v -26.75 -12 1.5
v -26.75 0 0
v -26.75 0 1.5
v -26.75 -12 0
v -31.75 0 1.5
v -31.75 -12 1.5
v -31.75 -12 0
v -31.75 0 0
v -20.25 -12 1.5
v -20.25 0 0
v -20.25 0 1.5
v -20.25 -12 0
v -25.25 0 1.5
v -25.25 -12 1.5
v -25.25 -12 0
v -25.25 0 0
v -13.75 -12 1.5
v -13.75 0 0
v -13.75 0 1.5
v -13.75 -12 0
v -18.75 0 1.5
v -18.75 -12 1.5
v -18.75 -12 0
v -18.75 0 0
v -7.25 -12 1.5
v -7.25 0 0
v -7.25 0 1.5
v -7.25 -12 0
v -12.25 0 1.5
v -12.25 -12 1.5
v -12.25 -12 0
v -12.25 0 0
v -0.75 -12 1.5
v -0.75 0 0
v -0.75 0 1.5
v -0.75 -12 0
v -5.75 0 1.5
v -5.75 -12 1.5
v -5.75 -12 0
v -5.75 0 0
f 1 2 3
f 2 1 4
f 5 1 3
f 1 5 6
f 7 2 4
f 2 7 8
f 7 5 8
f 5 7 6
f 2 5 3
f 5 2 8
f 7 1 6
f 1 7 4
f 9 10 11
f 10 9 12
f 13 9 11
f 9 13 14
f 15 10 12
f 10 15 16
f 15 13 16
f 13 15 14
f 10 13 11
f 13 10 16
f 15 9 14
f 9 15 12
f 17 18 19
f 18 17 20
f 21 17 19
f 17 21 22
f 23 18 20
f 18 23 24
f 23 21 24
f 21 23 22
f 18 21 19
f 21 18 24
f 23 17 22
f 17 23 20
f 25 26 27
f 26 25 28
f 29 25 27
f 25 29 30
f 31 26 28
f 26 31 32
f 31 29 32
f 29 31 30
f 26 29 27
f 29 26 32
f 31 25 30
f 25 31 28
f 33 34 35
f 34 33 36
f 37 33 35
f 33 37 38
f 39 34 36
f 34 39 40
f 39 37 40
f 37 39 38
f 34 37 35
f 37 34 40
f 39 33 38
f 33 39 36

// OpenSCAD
// 10-well comb for casting agarose gels, printed lying flat
// Units: mm

// ---------- Parameters ----------
plate_t      = 1.5;     // plate thickness (Z)
spine_len    = 70;      // spine length (X)
spine_wid    = 12;      // spine width (Y)
tooth_count  = 10;      // number of teeth
tooth_w      = 5.0;     // tooth width (X)
tooth_l      = 12;      // tooth length (Y)
tooth_gap    = 1.5;     // gap between teeth (X)
eps          = 0.5;     // cutter overshoot past faces

$fn = 64;

// ---------- Derived ----------
row_start = -(tooth_count * tooth_w + (tooth_count - 1) * tooth_gap) / 2; // first tooth X
pitch     = tooth_w + tooth_gap;                                          // centre-to-centre spacing

// ---------- Model ----------
difference() {
    // Base plate: spine + teeth
    translate([row_start, -tooth_l, 0])
        for (i = [0 : tooth_count - 1])
            translate([i * pitch, 0, 0])
                cube([tooth_w, tooth_l, plate_t]);

    translate([0, -tooth_l - eps, 0])
        cube([spine_len, tooth_l + 2 * eps, plate_t]); // spine under the teeth

    // Cut out the wells (through the plate)
    translate([row_start, 0, -eps])
        for (i = [0 : tooth_count - 1])
            translate([i * pitch, 0, 0])
                cube([tooth_w, tooth_l, plate_t + 2 * eps]);
}
